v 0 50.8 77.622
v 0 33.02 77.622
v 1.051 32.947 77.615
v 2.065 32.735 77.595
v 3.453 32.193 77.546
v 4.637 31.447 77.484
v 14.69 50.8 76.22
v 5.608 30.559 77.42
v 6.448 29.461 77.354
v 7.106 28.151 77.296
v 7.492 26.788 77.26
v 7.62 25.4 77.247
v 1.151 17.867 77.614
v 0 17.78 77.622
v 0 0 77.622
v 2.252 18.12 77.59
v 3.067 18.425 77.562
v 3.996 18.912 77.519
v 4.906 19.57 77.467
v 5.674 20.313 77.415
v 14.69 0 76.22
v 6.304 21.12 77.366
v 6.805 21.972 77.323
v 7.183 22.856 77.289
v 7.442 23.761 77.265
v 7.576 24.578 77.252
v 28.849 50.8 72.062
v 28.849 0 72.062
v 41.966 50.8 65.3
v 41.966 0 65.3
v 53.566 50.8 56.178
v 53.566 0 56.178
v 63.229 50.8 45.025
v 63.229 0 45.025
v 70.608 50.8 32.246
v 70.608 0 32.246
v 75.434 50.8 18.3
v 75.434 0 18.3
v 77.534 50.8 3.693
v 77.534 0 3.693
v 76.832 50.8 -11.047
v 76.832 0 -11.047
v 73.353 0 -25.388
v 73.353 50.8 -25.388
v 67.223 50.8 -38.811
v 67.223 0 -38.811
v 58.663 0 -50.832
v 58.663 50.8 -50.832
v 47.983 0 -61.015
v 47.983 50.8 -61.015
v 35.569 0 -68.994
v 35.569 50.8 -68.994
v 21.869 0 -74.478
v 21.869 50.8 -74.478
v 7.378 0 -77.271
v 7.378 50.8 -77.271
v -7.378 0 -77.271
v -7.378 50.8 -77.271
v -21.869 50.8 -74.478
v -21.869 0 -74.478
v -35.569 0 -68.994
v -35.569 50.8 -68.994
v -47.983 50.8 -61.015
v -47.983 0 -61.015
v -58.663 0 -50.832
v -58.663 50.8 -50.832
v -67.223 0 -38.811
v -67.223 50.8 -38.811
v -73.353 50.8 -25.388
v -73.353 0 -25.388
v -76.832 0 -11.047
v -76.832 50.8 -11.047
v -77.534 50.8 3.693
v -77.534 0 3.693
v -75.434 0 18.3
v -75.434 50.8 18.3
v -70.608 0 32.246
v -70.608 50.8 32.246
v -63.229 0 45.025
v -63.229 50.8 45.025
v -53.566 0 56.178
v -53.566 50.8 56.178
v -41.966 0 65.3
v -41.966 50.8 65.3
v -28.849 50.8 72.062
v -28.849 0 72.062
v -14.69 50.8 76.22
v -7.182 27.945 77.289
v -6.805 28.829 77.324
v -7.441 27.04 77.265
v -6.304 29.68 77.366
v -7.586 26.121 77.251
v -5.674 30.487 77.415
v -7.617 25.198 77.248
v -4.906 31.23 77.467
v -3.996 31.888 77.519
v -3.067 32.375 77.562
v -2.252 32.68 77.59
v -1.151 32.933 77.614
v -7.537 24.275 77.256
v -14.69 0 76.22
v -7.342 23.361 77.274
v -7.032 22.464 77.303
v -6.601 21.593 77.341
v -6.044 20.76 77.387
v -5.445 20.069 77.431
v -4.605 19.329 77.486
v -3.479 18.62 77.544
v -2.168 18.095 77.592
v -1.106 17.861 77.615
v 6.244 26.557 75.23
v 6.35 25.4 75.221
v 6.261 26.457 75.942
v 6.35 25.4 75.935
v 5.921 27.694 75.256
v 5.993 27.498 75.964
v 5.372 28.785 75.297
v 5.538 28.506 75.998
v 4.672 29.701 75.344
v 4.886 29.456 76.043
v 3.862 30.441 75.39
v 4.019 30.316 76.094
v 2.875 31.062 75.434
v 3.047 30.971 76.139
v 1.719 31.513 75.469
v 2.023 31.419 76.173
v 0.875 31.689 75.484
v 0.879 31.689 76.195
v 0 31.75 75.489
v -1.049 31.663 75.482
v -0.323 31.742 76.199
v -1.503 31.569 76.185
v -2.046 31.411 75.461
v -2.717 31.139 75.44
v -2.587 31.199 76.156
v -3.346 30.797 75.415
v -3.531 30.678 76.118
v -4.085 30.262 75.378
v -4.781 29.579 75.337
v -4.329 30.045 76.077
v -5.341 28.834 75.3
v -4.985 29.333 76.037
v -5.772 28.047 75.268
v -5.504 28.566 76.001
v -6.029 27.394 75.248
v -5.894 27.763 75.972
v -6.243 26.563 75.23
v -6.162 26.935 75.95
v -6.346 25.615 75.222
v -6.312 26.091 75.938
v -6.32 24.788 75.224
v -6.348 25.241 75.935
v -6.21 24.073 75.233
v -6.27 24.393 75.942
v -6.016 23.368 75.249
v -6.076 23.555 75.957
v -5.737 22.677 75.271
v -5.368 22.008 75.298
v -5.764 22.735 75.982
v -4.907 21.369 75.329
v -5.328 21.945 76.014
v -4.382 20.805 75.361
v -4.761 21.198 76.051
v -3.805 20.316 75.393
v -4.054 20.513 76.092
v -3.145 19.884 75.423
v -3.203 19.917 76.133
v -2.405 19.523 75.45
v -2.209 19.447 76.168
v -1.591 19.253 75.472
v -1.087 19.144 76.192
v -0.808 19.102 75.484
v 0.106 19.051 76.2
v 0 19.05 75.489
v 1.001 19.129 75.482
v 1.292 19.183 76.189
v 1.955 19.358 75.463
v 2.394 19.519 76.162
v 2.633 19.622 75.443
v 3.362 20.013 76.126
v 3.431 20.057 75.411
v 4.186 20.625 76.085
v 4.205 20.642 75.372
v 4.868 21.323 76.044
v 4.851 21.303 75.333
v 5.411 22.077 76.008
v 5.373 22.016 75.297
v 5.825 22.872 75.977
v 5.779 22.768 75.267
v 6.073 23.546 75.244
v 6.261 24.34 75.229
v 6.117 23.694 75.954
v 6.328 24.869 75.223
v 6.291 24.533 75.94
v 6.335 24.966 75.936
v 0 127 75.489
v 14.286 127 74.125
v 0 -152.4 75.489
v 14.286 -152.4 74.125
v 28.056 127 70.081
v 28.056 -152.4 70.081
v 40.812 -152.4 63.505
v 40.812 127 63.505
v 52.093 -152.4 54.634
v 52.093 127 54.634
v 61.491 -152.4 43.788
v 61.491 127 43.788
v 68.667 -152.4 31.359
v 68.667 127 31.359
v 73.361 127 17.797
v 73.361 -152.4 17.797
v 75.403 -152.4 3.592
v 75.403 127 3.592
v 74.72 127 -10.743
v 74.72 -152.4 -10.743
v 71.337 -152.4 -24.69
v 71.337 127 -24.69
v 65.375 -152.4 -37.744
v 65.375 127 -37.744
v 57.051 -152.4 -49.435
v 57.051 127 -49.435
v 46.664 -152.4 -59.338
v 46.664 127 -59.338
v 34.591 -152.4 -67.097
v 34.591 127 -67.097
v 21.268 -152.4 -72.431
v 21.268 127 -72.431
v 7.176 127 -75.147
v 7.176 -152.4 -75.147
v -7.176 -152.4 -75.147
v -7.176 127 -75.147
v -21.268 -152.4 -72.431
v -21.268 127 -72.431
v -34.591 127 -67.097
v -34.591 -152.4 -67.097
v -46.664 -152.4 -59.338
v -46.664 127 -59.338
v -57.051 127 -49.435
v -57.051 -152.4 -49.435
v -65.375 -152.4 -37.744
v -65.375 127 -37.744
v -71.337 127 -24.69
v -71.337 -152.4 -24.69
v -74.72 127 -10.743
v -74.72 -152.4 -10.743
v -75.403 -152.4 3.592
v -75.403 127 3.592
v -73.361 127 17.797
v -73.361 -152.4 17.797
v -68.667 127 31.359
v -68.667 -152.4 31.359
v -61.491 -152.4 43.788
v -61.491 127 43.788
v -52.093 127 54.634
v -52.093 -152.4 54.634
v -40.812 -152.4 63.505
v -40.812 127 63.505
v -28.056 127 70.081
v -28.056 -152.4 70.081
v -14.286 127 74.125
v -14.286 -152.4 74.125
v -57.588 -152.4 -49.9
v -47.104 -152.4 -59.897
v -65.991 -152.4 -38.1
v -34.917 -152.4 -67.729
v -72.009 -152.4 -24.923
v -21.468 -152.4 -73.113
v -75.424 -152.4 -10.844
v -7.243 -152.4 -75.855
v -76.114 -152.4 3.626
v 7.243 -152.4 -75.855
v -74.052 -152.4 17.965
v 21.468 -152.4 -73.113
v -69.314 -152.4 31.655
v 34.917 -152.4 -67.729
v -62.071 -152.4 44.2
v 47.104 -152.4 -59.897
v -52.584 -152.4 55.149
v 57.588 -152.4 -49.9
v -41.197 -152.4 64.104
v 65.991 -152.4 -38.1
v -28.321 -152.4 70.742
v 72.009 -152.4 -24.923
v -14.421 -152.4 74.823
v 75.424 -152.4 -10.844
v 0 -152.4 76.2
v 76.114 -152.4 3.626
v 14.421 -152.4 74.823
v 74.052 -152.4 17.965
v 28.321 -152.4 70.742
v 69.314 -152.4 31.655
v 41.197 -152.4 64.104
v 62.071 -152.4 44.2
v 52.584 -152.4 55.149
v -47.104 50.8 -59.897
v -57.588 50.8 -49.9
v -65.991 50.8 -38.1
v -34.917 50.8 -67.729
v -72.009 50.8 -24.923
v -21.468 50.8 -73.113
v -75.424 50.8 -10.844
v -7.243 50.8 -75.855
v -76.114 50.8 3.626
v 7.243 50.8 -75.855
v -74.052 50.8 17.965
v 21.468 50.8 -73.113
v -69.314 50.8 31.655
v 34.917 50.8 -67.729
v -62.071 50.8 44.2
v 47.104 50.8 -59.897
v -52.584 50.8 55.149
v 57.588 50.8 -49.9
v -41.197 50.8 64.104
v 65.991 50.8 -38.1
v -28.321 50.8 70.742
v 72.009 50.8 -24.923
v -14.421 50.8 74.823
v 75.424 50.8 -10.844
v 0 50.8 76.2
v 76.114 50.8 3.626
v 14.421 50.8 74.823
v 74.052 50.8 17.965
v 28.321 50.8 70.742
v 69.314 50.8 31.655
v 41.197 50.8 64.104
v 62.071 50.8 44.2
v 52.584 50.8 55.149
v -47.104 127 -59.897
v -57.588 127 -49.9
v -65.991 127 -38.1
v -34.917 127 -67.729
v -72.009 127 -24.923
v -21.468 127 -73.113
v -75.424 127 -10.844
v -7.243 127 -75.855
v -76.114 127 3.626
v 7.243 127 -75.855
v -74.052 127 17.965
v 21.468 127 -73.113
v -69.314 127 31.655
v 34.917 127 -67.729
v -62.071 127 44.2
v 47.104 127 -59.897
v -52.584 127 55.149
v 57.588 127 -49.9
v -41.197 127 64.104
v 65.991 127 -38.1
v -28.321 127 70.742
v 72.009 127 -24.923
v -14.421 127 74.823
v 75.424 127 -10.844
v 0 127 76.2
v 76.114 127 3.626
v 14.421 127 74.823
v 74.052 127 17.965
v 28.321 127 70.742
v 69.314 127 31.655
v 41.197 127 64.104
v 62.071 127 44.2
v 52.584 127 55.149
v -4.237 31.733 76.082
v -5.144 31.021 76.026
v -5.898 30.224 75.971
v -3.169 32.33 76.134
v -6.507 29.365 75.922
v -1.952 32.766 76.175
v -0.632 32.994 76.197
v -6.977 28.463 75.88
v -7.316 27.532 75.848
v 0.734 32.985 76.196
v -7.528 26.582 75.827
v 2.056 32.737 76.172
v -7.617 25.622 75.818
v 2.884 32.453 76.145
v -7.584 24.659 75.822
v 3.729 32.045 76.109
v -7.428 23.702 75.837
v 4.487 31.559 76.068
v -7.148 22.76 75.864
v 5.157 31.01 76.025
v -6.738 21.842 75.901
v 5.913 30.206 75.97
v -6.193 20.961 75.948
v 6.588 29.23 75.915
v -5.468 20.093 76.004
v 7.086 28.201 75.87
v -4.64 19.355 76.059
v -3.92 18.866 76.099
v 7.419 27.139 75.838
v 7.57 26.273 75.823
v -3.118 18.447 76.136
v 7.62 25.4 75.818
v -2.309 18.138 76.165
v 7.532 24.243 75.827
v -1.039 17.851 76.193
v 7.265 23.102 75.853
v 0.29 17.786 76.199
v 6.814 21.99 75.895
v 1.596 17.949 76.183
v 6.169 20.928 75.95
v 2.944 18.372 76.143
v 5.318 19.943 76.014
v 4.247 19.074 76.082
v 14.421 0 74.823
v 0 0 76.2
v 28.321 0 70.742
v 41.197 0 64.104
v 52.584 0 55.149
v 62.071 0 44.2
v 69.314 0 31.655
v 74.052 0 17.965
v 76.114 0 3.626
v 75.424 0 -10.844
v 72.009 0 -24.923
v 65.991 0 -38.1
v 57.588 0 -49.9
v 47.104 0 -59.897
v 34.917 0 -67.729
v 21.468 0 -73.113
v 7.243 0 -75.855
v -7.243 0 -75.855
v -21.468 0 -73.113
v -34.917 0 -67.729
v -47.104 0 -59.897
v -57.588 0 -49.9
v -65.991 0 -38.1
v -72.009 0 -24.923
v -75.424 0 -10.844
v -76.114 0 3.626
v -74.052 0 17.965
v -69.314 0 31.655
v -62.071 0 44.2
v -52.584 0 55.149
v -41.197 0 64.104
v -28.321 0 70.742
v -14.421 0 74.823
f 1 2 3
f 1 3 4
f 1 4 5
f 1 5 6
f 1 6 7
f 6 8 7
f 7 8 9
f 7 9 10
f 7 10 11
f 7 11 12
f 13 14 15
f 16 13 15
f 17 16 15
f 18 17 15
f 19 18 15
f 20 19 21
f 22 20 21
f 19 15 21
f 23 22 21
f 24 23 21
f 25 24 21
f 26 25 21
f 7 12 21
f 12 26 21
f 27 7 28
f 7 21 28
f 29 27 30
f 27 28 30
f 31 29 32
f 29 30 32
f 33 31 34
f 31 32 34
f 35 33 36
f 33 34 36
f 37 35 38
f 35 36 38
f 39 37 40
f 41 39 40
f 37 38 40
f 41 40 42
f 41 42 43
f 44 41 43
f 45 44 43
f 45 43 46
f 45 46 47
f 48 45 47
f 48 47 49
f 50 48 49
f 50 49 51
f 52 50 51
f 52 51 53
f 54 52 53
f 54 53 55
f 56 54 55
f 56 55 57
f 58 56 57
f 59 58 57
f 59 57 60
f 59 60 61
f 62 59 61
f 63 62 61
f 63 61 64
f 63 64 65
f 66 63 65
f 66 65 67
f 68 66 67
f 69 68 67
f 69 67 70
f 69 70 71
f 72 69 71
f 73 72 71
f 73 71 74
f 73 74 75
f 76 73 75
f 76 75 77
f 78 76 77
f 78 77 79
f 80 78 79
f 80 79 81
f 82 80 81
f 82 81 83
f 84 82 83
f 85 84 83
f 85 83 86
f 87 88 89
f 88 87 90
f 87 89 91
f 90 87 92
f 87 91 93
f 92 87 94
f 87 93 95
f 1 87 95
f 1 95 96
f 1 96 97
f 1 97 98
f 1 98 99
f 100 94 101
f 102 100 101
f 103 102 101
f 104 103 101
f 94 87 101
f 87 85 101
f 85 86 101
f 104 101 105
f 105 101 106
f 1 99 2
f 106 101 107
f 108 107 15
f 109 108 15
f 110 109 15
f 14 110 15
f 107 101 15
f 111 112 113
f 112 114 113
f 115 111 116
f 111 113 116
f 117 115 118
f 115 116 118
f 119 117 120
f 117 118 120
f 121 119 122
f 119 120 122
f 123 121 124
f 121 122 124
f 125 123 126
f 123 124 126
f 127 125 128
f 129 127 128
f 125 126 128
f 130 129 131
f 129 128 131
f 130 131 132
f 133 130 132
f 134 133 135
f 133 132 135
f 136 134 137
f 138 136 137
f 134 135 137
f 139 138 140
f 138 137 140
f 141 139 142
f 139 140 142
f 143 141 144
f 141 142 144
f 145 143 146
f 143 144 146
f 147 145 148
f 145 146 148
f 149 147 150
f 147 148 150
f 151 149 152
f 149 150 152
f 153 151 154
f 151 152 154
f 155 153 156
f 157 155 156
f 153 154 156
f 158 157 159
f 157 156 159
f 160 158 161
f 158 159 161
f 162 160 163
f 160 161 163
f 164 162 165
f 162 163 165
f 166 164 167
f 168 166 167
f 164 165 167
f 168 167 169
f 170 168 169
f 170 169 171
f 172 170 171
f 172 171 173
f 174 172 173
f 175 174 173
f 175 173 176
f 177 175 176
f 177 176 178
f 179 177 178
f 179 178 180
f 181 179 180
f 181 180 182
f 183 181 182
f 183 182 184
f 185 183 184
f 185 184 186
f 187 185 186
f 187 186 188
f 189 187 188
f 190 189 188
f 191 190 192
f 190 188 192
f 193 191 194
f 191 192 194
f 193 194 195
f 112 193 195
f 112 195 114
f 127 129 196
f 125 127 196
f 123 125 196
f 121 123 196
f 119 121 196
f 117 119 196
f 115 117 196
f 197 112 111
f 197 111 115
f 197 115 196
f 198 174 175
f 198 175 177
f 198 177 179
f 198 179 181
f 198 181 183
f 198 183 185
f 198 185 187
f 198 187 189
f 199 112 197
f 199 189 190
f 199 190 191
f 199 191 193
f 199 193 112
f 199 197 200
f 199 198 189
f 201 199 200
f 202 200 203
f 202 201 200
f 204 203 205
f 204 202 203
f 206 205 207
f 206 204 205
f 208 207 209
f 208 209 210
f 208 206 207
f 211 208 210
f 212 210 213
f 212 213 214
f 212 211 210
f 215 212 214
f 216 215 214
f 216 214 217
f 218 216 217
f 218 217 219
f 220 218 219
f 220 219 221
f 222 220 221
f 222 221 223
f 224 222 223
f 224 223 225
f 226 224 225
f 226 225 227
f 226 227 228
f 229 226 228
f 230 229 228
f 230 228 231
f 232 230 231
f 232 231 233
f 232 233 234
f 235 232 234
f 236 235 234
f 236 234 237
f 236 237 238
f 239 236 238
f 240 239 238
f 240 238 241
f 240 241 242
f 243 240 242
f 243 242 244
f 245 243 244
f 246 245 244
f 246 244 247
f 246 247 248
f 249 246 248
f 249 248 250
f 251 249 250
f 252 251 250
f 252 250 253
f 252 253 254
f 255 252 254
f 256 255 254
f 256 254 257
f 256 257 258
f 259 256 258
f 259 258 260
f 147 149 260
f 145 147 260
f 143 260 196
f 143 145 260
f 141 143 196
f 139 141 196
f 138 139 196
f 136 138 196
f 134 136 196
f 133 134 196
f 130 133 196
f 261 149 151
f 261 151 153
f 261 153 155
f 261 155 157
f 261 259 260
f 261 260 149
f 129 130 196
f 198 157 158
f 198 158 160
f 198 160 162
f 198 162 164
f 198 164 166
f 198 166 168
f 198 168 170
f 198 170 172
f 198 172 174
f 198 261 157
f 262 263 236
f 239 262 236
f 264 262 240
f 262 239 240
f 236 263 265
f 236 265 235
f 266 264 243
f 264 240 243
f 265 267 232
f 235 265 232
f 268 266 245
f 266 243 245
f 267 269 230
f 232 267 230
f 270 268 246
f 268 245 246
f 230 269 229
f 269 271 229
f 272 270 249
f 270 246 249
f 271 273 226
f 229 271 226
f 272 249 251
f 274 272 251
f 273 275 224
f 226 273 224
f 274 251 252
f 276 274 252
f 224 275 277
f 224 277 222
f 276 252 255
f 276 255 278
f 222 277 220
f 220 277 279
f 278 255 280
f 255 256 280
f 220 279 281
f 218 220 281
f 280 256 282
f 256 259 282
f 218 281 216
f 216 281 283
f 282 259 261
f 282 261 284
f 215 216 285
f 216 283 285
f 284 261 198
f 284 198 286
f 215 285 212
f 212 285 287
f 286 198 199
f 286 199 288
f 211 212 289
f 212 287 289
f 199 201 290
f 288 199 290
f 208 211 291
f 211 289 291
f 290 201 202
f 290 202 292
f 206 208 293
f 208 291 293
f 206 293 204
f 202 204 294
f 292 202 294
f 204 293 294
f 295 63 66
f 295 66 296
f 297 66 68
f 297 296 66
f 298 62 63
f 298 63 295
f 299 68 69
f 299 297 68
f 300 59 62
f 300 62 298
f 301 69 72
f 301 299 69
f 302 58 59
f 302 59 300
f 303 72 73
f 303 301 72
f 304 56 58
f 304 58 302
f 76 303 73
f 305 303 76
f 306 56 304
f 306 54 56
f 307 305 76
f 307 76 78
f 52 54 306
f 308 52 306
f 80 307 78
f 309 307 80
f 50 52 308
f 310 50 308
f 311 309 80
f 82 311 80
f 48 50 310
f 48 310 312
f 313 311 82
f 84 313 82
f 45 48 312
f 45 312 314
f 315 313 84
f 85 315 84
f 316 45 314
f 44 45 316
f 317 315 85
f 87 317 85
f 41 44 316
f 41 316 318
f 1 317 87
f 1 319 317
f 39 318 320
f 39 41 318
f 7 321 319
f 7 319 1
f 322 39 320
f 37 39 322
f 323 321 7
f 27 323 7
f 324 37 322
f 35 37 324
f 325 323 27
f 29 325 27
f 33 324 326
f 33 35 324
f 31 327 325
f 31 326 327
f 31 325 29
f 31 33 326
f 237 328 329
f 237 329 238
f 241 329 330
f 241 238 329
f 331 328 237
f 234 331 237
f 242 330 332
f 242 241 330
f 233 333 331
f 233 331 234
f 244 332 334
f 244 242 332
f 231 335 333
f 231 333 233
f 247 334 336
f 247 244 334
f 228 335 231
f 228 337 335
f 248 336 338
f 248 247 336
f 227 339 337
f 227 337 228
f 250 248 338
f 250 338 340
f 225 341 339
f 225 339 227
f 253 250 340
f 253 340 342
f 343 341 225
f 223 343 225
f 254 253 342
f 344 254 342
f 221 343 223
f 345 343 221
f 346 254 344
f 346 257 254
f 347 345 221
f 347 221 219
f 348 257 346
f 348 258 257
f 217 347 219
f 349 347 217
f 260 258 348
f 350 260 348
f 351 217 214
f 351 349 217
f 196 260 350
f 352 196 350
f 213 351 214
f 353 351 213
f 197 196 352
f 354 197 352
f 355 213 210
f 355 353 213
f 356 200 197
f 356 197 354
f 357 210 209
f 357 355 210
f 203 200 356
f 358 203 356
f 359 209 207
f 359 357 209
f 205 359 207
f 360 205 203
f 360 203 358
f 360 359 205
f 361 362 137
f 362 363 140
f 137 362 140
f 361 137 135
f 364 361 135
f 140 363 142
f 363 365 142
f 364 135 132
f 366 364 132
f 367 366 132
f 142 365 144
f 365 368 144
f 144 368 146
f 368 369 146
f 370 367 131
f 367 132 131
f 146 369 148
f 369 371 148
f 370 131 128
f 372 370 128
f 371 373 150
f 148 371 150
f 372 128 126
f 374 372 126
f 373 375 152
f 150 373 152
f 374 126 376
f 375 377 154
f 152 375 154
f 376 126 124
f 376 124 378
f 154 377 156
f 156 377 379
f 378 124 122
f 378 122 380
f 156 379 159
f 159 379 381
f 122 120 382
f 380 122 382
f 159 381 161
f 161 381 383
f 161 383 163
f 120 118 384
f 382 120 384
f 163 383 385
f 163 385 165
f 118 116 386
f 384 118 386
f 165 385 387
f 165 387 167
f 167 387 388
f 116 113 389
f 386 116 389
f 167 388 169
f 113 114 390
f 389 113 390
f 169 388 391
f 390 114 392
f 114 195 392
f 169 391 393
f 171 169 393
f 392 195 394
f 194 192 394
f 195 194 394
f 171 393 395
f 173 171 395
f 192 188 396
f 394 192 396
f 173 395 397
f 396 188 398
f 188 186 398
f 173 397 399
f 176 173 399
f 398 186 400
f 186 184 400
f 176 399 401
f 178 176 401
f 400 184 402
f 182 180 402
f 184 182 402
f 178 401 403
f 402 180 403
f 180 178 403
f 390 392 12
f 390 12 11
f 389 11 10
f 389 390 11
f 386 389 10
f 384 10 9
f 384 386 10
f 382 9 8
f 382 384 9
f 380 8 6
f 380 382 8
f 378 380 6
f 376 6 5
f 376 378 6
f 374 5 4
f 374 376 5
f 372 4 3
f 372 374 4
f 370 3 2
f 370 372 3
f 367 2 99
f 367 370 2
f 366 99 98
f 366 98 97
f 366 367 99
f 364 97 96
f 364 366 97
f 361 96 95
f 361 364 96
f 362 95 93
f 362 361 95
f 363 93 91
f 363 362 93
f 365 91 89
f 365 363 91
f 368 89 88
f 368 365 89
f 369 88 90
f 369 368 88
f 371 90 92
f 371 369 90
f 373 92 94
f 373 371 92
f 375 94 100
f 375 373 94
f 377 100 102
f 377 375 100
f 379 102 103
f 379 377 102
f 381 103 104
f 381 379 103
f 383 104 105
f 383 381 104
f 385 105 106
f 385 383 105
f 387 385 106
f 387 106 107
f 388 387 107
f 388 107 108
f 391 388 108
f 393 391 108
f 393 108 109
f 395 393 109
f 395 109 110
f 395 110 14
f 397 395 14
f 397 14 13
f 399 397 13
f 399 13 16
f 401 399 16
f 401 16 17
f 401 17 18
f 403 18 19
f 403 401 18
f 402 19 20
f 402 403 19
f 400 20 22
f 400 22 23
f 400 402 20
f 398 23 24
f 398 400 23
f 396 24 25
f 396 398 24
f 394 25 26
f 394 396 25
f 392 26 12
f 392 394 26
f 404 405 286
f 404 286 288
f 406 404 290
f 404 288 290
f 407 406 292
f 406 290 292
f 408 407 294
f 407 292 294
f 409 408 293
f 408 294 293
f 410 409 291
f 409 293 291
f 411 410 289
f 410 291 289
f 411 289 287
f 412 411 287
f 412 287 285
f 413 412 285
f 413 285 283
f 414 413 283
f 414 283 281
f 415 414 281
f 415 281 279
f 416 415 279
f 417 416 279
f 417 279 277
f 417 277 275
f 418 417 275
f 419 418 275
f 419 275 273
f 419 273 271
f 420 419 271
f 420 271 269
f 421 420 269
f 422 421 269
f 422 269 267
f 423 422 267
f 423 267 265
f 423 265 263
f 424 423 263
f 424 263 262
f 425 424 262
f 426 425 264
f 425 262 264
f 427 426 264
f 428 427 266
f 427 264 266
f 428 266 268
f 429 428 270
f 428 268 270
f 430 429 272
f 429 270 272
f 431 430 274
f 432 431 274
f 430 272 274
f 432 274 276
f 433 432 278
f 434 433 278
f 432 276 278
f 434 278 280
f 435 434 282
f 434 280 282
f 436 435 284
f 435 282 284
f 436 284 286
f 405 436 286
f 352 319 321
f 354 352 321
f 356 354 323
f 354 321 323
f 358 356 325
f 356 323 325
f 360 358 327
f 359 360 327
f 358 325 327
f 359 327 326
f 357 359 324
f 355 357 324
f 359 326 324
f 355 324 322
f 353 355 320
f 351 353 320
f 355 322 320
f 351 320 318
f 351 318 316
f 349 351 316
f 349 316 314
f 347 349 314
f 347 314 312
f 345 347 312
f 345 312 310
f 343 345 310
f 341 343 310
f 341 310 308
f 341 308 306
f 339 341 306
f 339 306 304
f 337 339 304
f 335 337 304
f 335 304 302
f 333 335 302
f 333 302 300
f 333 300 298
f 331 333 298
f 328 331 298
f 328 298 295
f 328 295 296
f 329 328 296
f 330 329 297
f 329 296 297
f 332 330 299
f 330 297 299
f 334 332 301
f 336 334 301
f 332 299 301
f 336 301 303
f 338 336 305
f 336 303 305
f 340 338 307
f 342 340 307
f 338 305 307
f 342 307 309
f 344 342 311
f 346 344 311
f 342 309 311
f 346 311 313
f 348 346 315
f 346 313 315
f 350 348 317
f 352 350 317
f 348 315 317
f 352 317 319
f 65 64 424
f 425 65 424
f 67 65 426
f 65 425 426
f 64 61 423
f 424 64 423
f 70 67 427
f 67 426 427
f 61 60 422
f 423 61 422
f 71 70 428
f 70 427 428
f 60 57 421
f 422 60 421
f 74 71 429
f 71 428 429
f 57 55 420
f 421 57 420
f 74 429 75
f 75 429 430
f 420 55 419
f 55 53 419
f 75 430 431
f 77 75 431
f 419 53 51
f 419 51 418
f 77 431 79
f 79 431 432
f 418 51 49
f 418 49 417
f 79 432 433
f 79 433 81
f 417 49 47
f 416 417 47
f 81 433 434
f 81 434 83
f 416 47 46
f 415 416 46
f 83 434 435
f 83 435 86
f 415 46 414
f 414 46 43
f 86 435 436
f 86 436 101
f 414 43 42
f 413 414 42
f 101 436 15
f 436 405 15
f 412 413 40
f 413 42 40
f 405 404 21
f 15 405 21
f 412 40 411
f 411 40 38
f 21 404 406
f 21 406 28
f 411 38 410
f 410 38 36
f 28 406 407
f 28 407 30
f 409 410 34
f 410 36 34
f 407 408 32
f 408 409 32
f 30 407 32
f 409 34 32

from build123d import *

# Parameters (mm, degrees)
BOSS_EXTRUDE1_DEPTH                  = 127
BOSS_EXTRUDE1_DEPTH_BACK             = 152.4
SKETCH1_R                            = 76.2
SKETCH1_R_2                          = 75.4888
SKETCH2_R                            = 77.6224
SKETCH2_R_2                          = 76.2
BOSS_EXTRUDE2_DEPTH                  = 50.8
F_1_2_0_5_DIAMETER_HOLE2_REACH       = 232.98
F_1_2_0_5_DIAMETER_HOLE2_BORE_R      = 6.35
F_1_2_START                          = 75.818042607
F_1_2_0_6_DIAMETER_HOLE1_OUTLINE_R   = 7.62
F_1_2_0_6_DIAMETER_HOLE1_OUTLINE_R_2 = 6.35
F_1_2_0_6_DIAMETER_HOLE1_DEPTH       = 3.181957393
F_1_2_START_2                        = 17
F_1_2_0_6_DIAMETER_HOLE1_2_DEPTH     = 17
F_1_2_START_3                        = 75.818042657
F_1_2_0_6_DIAMETER_HOLE1_3_OUTLINE_R = 6.35
F_1_2_0_6_DIAMETER_HOLE1_3_DEPTH     = 1.181957343


with BuildPart() as part:
    # Sketch1 → Boss-Extrude1 (new, two sides: drawn at the far end of the back side and taken through both)
    with BuildSketch(Plane(origin=(0, 0, 0), x_dir=(1, 0, 0), z_dir=(0, 1, 0)).offset(-BOSS_EXTRUDE1_DEPTH_BACK)):
        with Locations(Location((0, 0, 0), (0, 0, 270))):
            Circle(SKETCH1_R)
        with Locations(Location((0, 0, 0), (0, 0, 270))):
            Circle(SKETCH1_R_2, mode=Mode.SUBTRACT)
    extrude(amount=BOSS_EXTRUDE1_DEPTH + BOSS_EXTRUDE1_DEPTH_BACK)

    # Sketch2 → Boss-Extrude2 (add)
    with BuildSketch(Plane(origin=(0, 0, 0), x_dir=(1, 0, 0), z_dir=(0, 1, 0))):
        with Locations(Location((0, 0, 0), (0, 0, 270))):
            Circle(SKETCH2_R)
        with Locations(Location((0, 0, 0), (0, 0, 270))):
            Circle(SKETCH2_R_2, mode=Mode.SUBTRACT)
    extrude(amount=BOSS_EXTRUDE2_DEPTH)

    # 1/2 (0.5) Diameter Hole2 bore → 1/2 (0.5) Diameter Hole2 (cut, up to next)
    with BuildSketch(Plane.XY.offset(77.6224), mode=Mode.PRIVATE) as f_1_2_0_5_diameter_hole2_sk1:
        with Locations((0, 25.4)):
            Circle(F_1_2_0_5_DIAMETER_HOLE2_BORE_R)
    f_1_2_0_5_diameter_hole2_tool1 = extrude(f_1_2_0_5_diameter_hole2_sk1.sketch, amount=-F_1_2_0_5_DIAMETER_HOLE2_REACH, mode=Mode.PRIVATE) & part.part
    add(f_1_2_0_5_diameter_hole2_tool1.solids().sort_by_distance((0, 25.4, 77.6224))[0], mode=Mode.SUBTRACT)

    # 1/2 (0.6) Diameter Hole1: read off the stored shape, not the designer's step
    # 1/2 (0.6) Diameter Hole1 outline → 1/2 (0.6) Diameter Hole1 (cut)
    with BuildSketch(Plane.XY.offset(F_1_2_START)):
        with Locations((0, 25.4)):
            Circle(F_1_2_0_6_DIAMETER_HOLE1_OUTLINE_R)
        with Locations((0, 25.4)):
            Circle(F_1_2_0_6_DIAMETER_HOLE1_OUTLINE_R_2, mode=Mode.SUBTRACT)
    extrude(amount=F_1_2_0_6_DIAMETER_HOLE1_DEPTH, mode=Mode.SUBTRACT)

    # 1_2 _0.6_ Diameter Hole1 2 outline → 1_2 _0.6_ Diameter Hole1 2 (add)
    with BuildSketch(Plane(origin=(0, 0, 0), x_dir=(1, 0, 0), z_dir=(0, 1, 0)).offset(F_1_2_START_2)):
        with BuildLine():
            Line((7.620000605, -75.818042647), (-7.62000001, -75.818042706))
            ThreePointArc((-7.62000001, -75.818042706), (2.99e-07, -76.2), (7.620000605, -75.818042647))
        make_face()
    extrude(amount=F_1_2_0_6_DIAMETER_HOLE1_2_DEPTH)

    # 1_2 _0.6_ Diameter Hole1 3 outline → 1_2 _0.6_ Diameter Hole1 3 (cut)
    with BuildSketch(Plane.XY.offset(F_1_2_START_3)):
        with Locations((0, 25.4)):
            Circle(F_1_2_0_6_DIAMETER_HOLE1_3_OUTLINE_R)
    extrude(amount=F_1_2_0_6_DIAMETER_HOLE1_3_DEPTH, mode=Mode.SUBTRACT)


solid = part.part
